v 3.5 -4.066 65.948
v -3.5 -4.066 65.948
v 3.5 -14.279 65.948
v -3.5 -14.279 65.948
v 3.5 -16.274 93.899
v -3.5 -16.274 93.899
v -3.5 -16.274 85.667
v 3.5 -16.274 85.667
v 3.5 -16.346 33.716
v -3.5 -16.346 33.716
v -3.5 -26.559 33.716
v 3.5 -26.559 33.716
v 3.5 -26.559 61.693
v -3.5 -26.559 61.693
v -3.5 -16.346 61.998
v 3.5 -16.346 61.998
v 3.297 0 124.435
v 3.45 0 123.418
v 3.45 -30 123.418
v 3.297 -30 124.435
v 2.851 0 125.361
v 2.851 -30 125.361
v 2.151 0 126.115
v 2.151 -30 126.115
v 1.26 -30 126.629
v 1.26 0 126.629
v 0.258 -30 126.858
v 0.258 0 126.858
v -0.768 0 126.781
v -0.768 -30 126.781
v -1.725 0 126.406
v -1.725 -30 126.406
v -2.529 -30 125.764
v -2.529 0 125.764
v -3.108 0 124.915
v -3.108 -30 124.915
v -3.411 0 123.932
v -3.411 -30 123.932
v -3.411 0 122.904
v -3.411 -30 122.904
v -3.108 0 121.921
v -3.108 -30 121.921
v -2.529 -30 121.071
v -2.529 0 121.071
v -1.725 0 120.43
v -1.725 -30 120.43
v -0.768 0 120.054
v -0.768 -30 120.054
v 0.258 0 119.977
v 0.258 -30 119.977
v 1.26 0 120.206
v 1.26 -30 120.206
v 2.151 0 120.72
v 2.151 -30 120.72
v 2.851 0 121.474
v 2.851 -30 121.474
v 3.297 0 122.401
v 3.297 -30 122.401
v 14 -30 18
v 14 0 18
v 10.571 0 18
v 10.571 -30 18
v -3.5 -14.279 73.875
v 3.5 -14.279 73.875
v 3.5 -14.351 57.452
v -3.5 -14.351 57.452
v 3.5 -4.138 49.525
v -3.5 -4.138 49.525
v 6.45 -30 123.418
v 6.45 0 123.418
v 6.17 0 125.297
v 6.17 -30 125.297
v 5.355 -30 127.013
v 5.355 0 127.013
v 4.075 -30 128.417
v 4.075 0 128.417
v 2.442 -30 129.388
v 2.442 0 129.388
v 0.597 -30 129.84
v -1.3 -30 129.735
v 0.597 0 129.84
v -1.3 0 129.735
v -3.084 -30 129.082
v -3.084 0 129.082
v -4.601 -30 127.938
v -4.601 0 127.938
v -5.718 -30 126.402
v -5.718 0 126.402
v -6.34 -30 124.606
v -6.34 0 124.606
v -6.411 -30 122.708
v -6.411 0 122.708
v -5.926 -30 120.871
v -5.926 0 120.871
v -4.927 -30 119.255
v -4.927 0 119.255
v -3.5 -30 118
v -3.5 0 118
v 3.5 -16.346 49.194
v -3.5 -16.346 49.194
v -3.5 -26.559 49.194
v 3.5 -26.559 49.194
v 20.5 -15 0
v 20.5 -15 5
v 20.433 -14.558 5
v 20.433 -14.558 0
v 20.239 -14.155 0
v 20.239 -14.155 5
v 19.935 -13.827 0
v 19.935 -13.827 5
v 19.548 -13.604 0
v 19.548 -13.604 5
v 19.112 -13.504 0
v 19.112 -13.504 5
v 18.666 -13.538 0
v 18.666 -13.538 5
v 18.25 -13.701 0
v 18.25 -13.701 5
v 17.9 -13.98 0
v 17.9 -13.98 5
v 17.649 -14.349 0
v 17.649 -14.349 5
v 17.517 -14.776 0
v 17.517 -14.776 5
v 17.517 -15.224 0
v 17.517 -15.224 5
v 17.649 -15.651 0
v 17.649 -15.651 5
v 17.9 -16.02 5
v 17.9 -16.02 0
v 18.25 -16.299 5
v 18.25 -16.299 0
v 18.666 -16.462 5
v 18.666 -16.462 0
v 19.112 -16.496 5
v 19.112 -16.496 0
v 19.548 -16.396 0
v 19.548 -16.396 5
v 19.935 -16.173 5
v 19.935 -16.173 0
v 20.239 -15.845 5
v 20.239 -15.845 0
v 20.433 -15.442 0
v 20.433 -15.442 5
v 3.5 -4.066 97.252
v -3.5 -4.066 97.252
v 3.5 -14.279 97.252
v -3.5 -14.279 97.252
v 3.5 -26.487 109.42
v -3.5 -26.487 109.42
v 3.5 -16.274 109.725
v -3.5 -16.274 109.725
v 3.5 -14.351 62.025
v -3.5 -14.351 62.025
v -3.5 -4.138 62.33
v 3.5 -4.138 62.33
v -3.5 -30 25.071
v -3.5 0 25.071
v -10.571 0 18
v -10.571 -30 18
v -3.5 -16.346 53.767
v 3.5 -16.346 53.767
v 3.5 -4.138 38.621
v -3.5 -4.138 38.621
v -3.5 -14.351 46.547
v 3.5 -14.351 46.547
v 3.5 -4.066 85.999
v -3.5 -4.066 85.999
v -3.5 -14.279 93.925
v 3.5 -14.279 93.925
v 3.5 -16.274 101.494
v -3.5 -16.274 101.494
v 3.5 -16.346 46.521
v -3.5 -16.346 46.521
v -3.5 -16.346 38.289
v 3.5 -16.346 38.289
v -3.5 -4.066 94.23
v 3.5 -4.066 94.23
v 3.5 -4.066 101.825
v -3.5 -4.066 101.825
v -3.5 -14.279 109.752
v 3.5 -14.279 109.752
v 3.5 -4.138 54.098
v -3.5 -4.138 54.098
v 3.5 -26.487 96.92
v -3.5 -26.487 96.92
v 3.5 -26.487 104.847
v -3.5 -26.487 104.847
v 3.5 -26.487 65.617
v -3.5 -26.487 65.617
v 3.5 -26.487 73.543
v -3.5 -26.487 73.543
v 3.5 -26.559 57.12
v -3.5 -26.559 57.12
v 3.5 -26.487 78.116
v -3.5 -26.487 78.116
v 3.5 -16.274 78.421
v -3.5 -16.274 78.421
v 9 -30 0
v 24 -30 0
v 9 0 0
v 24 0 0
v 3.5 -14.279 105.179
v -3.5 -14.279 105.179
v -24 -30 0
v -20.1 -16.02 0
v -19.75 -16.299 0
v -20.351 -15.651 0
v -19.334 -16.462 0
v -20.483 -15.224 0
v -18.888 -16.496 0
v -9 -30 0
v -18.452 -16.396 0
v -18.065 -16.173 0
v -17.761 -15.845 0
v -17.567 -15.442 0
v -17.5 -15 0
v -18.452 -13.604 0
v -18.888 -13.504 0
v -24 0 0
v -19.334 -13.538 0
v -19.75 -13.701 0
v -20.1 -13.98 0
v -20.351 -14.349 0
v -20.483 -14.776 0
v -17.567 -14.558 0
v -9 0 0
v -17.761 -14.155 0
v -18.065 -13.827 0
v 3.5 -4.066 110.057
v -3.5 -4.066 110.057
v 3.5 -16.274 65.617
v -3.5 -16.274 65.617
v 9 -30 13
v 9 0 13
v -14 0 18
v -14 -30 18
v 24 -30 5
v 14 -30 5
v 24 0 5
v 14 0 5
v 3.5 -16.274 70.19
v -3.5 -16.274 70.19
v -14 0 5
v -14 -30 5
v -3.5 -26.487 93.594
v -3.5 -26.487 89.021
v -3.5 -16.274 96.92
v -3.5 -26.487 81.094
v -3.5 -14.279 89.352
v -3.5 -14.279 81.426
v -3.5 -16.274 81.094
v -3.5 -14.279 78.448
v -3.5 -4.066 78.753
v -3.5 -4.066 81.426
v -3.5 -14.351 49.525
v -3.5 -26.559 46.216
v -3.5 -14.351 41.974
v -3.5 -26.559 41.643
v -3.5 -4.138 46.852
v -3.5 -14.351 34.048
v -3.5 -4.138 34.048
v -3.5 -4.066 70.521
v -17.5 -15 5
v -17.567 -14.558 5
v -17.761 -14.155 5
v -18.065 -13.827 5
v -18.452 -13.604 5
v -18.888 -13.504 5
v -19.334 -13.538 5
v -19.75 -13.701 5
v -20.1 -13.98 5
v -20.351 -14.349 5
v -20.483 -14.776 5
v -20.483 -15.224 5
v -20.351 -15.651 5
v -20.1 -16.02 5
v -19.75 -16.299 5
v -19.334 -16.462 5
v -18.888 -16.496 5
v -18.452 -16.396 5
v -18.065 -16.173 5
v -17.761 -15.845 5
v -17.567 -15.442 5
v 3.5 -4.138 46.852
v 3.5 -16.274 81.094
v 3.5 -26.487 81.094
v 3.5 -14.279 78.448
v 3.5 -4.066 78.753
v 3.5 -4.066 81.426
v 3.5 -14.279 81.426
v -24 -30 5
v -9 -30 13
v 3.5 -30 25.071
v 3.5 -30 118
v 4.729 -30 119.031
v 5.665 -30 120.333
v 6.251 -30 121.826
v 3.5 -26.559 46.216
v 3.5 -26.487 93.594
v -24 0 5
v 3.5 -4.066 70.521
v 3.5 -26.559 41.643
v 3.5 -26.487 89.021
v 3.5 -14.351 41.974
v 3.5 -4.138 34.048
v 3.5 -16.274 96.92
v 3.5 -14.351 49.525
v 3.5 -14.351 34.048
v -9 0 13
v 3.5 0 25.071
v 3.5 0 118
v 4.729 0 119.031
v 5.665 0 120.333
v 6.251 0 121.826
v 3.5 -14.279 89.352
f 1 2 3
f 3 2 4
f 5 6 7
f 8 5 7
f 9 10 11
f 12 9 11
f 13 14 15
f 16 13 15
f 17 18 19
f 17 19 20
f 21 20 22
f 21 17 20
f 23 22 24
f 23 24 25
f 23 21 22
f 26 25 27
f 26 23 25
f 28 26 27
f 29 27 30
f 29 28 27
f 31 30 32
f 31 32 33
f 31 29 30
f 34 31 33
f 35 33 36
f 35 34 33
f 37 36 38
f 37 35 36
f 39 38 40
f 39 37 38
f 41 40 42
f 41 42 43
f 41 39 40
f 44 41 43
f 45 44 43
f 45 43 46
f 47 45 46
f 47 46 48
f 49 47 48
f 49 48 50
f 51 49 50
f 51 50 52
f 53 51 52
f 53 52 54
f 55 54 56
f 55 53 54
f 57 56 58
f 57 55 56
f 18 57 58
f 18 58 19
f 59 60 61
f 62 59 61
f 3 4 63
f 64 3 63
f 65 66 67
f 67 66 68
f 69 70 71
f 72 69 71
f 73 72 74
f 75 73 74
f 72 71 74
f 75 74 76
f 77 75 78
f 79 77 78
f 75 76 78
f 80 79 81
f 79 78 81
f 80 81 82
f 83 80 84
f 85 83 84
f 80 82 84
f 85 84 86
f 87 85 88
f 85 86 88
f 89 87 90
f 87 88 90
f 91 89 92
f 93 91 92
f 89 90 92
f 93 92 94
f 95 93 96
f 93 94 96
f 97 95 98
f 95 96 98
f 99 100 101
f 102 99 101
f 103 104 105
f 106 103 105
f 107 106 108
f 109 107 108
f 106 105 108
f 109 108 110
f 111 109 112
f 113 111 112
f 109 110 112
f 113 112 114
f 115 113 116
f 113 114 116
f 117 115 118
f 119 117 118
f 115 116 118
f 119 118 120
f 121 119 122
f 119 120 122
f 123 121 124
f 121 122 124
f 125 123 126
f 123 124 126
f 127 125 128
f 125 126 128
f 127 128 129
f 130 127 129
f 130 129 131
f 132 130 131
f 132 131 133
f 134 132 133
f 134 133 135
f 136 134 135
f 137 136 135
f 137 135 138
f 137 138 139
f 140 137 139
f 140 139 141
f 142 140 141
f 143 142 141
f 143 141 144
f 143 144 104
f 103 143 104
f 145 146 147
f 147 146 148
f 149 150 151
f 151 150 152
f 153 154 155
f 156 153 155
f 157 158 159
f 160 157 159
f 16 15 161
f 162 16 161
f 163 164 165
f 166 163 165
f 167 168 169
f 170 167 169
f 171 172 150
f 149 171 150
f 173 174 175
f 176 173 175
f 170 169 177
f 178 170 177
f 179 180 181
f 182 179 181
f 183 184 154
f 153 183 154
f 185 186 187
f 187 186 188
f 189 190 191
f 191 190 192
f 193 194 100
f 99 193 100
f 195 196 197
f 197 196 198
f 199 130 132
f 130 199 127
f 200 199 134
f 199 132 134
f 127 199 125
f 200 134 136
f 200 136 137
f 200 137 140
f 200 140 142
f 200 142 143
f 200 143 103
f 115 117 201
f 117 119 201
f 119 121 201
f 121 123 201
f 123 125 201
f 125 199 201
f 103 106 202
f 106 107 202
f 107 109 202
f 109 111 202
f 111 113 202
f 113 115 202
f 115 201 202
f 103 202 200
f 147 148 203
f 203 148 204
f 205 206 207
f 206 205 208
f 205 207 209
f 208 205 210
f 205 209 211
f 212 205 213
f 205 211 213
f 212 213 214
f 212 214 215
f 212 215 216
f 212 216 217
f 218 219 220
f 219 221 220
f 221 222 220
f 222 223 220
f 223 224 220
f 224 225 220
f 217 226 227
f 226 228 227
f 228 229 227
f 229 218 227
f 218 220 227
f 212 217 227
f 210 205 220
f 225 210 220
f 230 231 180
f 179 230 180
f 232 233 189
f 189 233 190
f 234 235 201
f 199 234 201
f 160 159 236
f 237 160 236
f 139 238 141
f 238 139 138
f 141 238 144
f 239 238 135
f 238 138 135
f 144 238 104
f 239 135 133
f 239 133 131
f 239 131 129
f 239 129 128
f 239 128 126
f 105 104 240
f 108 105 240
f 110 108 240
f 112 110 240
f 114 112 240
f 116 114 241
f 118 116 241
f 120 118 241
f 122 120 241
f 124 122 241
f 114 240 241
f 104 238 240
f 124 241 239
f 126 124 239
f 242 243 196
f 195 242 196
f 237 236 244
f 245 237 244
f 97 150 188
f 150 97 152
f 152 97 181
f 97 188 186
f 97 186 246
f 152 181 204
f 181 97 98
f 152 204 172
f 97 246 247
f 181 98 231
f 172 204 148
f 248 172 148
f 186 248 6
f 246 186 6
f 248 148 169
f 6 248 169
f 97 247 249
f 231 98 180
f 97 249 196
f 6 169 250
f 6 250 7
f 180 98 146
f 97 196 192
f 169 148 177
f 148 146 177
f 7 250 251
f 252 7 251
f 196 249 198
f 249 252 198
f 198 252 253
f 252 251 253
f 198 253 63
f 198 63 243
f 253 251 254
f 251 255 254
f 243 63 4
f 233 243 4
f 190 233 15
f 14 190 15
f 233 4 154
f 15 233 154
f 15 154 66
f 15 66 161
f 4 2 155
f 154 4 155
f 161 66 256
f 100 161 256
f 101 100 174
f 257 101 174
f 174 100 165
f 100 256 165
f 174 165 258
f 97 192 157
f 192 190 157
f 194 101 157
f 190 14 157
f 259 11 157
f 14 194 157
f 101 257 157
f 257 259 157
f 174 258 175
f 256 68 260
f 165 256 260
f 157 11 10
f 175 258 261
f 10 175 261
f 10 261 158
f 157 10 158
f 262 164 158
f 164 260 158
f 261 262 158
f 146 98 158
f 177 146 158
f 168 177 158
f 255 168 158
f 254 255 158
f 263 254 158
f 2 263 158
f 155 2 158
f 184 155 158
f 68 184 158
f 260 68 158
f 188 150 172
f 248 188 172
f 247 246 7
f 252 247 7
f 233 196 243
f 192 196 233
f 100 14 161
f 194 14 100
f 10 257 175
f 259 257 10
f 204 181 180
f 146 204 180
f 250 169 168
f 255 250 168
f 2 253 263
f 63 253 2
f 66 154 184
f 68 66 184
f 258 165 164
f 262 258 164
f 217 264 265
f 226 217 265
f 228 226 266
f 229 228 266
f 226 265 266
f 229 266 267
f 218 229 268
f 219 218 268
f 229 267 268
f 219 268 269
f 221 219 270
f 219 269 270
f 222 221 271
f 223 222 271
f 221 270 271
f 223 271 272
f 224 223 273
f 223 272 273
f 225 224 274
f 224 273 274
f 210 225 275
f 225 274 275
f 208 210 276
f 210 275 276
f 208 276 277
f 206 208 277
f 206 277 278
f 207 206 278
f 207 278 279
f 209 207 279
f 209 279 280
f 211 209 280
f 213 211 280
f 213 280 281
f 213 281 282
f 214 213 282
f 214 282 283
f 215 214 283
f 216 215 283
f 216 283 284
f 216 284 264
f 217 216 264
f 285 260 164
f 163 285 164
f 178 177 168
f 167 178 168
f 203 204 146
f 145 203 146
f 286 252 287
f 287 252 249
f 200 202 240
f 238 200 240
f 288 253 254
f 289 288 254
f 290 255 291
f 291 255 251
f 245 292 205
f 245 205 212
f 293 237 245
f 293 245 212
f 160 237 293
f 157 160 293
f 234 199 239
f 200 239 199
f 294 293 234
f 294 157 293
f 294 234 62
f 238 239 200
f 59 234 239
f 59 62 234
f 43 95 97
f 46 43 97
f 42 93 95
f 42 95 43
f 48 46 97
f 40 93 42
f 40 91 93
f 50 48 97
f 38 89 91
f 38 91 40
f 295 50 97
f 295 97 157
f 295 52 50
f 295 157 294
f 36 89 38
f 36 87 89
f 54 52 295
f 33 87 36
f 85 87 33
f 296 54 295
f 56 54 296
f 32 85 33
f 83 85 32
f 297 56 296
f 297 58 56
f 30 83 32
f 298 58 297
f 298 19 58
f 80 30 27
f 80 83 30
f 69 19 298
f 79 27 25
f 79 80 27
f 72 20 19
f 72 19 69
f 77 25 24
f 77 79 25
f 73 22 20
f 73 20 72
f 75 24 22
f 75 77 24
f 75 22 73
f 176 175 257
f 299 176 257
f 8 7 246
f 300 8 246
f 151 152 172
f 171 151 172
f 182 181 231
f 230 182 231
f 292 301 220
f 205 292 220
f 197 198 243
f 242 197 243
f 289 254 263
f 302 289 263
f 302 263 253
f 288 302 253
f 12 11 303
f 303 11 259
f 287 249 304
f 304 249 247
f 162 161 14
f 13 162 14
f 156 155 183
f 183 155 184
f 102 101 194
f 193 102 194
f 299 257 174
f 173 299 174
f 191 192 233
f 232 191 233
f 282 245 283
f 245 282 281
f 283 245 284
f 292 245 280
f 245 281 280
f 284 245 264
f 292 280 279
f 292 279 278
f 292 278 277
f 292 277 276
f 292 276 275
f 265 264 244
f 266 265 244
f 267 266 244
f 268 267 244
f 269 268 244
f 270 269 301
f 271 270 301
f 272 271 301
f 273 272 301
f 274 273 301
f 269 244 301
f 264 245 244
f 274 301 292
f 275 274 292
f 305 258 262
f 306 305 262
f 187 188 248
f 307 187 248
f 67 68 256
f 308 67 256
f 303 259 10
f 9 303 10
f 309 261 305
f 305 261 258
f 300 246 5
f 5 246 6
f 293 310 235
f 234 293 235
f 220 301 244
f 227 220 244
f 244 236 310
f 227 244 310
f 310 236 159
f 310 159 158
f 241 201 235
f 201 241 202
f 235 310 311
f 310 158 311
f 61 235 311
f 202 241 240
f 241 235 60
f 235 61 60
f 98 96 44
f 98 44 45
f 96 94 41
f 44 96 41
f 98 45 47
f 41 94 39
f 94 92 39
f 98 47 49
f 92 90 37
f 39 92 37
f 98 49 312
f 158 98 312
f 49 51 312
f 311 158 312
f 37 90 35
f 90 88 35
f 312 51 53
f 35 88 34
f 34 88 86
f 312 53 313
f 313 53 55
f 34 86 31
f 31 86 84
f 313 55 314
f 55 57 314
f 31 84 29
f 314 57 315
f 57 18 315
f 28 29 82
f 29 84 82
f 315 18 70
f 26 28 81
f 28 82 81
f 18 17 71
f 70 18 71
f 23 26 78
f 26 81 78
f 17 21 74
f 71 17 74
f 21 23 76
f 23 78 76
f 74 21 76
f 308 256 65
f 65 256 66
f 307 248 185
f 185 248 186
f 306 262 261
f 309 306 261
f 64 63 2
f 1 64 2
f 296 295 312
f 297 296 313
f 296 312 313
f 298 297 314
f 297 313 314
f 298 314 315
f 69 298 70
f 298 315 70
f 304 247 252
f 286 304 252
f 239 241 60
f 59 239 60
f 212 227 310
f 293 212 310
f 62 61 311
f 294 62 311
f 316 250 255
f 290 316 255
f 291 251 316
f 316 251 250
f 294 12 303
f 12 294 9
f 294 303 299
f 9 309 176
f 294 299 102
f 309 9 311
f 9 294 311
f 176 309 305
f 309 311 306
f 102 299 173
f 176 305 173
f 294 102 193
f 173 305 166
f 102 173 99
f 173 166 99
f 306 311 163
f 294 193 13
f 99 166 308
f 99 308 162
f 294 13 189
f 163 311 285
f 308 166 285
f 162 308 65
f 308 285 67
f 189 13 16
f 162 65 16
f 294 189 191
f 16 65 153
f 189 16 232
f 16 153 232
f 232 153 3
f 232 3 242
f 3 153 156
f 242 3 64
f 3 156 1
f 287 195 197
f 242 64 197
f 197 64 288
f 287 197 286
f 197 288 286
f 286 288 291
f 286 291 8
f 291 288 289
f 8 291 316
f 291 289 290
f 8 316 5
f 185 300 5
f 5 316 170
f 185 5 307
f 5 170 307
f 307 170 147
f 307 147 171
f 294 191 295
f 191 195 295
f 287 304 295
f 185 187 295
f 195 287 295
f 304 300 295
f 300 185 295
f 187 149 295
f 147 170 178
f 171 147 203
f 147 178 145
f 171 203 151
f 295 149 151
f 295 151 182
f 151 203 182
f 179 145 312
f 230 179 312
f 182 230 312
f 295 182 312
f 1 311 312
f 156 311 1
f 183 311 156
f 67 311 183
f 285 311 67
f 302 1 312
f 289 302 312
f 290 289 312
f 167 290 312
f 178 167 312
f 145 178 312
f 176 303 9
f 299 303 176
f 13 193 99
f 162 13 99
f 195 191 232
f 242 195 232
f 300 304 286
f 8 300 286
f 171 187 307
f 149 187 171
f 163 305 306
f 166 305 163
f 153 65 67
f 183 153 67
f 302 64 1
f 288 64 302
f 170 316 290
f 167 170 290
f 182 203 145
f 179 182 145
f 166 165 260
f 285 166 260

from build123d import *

# Parameters (mm, degrees)
F0_R     = 3.45
F1_DEPTH = 30
F2_R     = 1.5
F3_DEPTH = 25.4
F5_DEPTH = 25.4


with BuildPart() as f1:
    # F0 (on Front) → F1 (new body)
    with BuildSketch(Plane.XZ):
        Polygon((-24, 5), (-24, 0), (-9, 0), (-9, 13), (0, 13), (9, 13), (9, 0), (24, 0), (24, 5), (14, 5), (14, 18), (10.571068, 18), (3.5, 18), (0, 18), (-3.5, 18), (-10.571068, 18), (-14, 18), (-14, 5), align=None)
        Polygon((-3.5, 25.071068), (-10.571068, 18), (-3.5, 18), align=None)
        with BuildLine():
            Line((-3.5, 25.071068), (-3.5, 18))
            Line((-3.5, 18), (0, 18))
            Line((0, 18), (3.5, 18))
            Line((3.5, 18), (3.5, 25.071068))
            Line((3.5, 25.071068), (3.5, 118))
            ThreePointArc((3.5, 118), (0, 116.967795), (-3.5, 118))
            Line((-3.5, 118), (-3.5, 25.071068))
        make_face()
        with BuildLine():
            ThreePointArc((6.45, 123.417795), (-3.084437, 129.082488), (-3.5, 118))
            ThreePointArc((-3.5, 118), (0, 116.967795), (3.5, 118))
            ThreePointArc((3.5, 118), (5.664693, 120.333358), (6.45, 123.417795))
        make_face()
        with Locations((0, 123.417795)):
            Circle(F0_R, mode=Mode.SUBTRACT)
        Polygon((3.5, 25.071068), (3.5, 18), (10.571068, 18), align=None)
    extrude(amount=F1_DEPTH)

    # F2 (on face) → F3 (cut)
    with BuildSketch(Plane.XY.offset(5)):
        with Locations((19, -15)):
            Circle(F2_R)
        with Locations((-19, -15)):
            Circle(F2_R)
    extrude(amount=-F3_DEPTH, mode=Mode.SUBTRACT)

    # F4 (on face) → F5 (cut)
    with BuildSketch(Plane(origin=(-3.5, 0, 0), x_dir=(0, -1, 0), z_dir=(-1, 0, 0))):
        Polygon((14.351341, 41.974204), (4.138201, 34.047591), (14.351341, 34.047591), align=None)
        Polygon((4.138201, 38.620638), (14.351341, 46.547251), (4.138201, 46.852125), align=None)
        Polygon((14.351341, 57.451731), (4.138201, 49.525118), (14.351341, 49.525118), align=None)
        Polygon((4.138201, 54.098165), (14.351341, 62.024778), (4.138201, 62.329652), align=None)
        Polygon((14.279029, 73.874906), (4.065889, 65.948293), (14.279029, 65.948293), align=None)
        Polygon((4.065889, 70.52134), (14.279029, 78.447953), (4.065889, 78.752828), align=None)
        Polygon((14.279029, 89.352433), (4.065889, 81.42582), (14.279029, 81.42582), align=None)
        Polygon((4.065889, 85.998867), (14.279029, 93.92548), (4.065889, 94.230354), align=None)
        Polygon((26.558967, 41.64265), (16.345827, 33.716037), (26.558967, 33.716037), align=None)
        Polygon((16.345827, 38.289084), (26.558967, 46.215698), (16.345827, 46.520572), align=None)
        Polygon((26.558967, 57.120177), (16.345827, 49.193564), (26.558967, 49.193564), align=None)
        Polygon((16.345827, 53.766611), (26.558967, 61.693224), (16.345827, 61.998098), align=None)
        Polygon((26.486655, 73.543353), (16.273515, 65.61674), (26.486655, 65.61674), align=None)
        Polygon((16.273515, 70.189787), (26.486655, 78.1164), (16.273515, 78.421274), align=None)
        Polygon((26.486655, 89.02088), (16.273515, 81.094267), (26.486655, 81.094267), align=None)
        Polygon((16.273515, 85.667314), (26.486655, 93.593927), (16.273515, 93.898801), align=None)
        Polygon((14.279029, 105.178627), (4.065889, 97.252014), (14.279029, 97.252014), align=None)
        Polygon((4.065889, 101.825062), (14.279029, 109.751675), (4.065889, 110.056549), align=None)
        Polygon((26.486655, 104.847074), (16.273515, 96.920461), (26.486655, 96.920461), align=None)
        Polygon((16.273515, 101.493508), (26.486655, 109.420121), (16.273515, 109.724995), align=None)
    extrude(amount=-F5_DEPTH, mode=Mode.SUBTRACT)


solid = f1.part
